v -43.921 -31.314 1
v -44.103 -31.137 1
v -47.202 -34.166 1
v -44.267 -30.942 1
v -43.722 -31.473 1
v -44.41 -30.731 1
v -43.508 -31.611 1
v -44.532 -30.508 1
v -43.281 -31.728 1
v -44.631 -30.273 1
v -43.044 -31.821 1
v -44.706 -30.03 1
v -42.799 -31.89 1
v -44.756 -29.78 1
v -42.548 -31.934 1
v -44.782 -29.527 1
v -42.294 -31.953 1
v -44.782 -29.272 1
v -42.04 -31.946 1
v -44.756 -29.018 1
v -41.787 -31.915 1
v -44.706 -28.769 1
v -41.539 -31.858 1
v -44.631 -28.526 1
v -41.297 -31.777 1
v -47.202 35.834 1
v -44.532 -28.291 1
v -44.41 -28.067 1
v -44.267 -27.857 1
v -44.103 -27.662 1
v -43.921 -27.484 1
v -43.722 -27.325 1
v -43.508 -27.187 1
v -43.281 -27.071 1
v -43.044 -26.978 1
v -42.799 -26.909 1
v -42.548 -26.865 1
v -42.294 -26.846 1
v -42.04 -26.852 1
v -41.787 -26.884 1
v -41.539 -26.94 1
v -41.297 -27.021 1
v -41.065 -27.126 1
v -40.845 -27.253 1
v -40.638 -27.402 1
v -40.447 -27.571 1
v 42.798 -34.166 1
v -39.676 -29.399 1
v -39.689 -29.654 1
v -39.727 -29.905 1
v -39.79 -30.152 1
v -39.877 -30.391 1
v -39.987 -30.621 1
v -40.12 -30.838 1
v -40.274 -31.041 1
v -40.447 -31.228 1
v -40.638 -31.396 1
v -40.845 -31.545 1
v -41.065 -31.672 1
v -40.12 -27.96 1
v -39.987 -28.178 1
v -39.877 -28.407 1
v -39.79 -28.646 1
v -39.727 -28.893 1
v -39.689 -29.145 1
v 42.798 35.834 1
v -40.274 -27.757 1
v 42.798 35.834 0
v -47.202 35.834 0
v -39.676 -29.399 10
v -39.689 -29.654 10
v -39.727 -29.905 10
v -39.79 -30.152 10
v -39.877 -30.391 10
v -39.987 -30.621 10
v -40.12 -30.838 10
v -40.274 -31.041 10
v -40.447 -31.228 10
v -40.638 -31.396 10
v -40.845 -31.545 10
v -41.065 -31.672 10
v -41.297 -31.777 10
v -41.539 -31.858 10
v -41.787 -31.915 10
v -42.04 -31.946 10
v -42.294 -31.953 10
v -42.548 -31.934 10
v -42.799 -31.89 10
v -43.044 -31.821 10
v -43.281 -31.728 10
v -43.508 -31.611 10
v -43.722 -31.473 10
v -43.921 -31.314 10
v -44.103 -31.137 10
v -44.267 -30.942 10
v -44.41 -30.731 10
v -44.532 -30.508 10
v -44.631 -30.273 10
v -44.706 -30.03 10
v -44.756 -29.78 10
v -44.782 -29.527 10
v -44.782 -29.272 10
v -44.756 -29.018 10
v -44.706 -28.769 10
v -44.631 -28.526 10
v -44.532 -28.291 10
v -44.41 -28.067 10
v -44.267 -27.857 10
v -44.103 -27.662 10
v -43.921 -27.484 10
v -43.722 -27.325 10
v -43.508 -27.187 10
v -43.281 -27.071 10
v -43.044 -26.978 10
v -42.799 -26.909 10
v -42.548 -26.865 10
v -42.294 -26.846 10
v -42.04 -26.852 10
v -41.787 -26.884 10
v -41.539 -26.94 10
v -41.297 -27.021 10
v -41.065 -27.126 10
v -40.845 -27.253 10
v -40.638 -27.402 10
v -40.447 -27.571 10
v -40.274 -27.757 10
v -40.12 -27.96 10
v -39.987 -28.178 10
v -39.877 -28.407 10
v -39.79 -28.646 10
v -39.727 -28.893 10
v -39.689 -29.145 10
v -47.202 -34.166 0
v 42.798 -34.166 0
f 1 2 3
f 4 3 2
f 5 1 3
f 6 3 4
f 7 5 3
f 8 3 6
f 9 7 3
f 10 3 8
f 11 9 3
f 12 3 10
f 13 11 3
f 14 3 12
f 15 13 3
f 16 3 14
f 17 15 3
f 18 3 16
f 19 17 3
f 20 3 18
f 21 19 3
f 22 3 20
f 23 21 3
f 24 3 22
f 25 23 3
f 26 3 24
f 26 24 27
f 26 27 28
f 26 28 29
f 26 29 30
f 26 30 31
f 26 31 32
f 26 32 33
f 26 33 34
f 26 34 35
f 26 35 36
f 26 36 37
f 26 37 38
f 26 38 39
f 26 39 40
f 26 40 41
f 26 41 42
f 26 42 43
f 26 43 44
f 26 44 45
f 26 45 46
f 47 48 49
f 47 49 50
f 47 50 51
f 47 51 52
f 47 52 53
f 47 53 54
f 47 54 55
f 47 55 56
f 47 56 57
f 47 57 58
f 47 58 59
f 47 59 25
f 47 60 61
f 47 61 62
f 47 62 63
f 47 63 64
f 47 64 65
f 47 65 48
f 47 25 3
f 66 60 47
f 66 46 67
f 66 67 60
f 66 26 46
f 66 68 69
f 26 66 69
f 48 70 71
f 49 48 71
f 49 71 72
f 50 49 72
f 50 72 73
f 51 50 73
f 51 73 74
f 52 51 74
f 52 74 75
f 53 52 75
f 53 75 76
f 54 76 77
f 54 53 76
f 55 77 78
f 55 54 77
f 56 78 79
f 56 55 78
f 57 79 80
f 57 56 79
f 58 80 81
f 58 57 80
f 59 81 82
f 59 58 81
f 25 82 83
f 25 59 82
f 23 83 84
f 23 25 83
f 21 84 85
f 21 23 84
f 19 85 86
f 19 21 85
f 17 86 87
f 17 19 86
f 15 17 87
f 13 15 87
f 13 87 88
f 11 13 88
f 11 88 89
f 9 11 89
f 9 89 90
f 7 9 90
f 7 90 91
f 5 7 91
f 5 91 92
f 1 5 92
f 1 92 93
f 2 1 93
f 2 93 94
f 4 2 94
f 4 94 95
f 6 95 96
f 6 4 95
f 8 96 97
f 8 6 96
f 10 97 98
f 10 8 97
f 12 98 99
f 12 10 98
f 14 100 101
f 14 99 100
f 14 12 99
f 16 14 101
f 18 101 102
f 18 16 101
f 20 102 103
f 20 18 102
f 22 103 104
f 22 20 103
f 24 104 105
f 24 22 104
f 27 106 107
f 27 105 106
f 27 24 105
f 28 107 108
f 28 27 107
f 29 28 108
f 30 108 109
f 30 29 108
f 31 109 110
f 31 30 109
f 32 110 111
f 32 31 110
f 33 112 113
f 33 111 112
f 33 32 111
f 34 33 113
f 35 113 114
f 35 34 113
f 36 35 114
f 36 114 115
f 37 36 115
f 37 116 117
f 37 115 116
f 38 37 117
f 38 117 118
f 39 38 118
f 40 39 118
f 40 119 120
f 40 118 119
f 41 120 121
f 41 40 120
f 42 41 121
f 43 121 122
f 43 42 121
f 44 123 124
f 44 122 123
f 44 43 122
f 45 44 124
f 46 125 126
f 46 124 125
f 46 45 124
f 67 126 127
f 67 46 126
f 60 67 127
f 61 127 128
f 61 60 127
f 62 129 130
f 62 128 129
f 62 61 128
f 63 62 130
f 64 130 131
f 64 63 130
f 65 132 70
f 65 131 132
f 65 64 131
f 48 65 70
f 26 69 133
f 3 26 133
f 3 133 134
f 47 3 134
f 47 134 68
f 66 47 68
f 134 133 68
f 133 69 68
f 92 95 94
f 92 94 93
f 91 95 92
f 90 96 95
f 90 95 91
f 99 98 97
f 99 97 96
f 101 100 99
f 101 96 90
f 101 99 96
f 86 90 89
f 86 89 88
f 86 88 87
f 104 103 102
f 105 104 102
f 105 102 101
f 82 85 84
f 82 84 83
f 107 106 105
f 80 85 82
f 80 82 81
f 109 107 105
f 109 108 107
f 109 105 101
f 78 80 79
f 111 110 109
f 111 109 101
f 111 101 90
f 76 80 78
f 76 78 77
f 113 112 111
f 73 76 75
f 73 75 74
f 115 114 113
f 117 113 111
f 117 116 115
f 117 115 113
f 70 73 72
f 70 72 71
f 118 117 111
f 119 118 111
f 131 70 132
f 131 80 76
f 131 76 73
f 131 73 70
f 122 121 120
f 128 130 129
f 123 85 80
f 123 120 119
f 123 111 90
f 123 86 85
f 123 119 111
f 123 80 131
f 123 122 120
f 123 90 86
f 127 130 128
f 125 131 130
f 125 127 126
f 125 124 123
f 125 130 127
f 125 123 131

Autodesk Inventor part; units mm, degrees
ref_plane "YZ Plane" through (0, 0, 0) normal (1, 0, 0) x (0, 1, 0)
ref_plane "XZ Plane" through (0, 0, 0) normal (0, 1, 0) x (-1, 0, 0)
ref_plane "XY Plane" through (0, 0, 0) normal (0, 0, 1) x (1, 0, 0)
sketch "Sketch1" plane through (0, 0, 0) normal (0, 0, 1) x (1, 0, 0)
  line L0 (-47.2018, -34.166) -> (42.7982, -34.166)
  line L1 (42.7982, -34.166) -> (42.7982, 35.834)
  line L2 (42.7982, 35.834) -> (-47.2018, 35.834)
  line L3 (-47.2018, 35.834) -> (-47.2018, -34.166)
  circle A0 centre (-42.2305, -29.3992) radius 2.5544
  point P0 (0, 0)
  dimension "d0" = 90
  dimension "d1" = 70
extrude "Extrusion1" add sketch "Sketch1" along normal blind 1 contours L3 L2 L1 L0 | A0
extrude "Extrusion2" add sketch "Sketch1" along normal blind 10 contours A0
properties part number "protoboard"
